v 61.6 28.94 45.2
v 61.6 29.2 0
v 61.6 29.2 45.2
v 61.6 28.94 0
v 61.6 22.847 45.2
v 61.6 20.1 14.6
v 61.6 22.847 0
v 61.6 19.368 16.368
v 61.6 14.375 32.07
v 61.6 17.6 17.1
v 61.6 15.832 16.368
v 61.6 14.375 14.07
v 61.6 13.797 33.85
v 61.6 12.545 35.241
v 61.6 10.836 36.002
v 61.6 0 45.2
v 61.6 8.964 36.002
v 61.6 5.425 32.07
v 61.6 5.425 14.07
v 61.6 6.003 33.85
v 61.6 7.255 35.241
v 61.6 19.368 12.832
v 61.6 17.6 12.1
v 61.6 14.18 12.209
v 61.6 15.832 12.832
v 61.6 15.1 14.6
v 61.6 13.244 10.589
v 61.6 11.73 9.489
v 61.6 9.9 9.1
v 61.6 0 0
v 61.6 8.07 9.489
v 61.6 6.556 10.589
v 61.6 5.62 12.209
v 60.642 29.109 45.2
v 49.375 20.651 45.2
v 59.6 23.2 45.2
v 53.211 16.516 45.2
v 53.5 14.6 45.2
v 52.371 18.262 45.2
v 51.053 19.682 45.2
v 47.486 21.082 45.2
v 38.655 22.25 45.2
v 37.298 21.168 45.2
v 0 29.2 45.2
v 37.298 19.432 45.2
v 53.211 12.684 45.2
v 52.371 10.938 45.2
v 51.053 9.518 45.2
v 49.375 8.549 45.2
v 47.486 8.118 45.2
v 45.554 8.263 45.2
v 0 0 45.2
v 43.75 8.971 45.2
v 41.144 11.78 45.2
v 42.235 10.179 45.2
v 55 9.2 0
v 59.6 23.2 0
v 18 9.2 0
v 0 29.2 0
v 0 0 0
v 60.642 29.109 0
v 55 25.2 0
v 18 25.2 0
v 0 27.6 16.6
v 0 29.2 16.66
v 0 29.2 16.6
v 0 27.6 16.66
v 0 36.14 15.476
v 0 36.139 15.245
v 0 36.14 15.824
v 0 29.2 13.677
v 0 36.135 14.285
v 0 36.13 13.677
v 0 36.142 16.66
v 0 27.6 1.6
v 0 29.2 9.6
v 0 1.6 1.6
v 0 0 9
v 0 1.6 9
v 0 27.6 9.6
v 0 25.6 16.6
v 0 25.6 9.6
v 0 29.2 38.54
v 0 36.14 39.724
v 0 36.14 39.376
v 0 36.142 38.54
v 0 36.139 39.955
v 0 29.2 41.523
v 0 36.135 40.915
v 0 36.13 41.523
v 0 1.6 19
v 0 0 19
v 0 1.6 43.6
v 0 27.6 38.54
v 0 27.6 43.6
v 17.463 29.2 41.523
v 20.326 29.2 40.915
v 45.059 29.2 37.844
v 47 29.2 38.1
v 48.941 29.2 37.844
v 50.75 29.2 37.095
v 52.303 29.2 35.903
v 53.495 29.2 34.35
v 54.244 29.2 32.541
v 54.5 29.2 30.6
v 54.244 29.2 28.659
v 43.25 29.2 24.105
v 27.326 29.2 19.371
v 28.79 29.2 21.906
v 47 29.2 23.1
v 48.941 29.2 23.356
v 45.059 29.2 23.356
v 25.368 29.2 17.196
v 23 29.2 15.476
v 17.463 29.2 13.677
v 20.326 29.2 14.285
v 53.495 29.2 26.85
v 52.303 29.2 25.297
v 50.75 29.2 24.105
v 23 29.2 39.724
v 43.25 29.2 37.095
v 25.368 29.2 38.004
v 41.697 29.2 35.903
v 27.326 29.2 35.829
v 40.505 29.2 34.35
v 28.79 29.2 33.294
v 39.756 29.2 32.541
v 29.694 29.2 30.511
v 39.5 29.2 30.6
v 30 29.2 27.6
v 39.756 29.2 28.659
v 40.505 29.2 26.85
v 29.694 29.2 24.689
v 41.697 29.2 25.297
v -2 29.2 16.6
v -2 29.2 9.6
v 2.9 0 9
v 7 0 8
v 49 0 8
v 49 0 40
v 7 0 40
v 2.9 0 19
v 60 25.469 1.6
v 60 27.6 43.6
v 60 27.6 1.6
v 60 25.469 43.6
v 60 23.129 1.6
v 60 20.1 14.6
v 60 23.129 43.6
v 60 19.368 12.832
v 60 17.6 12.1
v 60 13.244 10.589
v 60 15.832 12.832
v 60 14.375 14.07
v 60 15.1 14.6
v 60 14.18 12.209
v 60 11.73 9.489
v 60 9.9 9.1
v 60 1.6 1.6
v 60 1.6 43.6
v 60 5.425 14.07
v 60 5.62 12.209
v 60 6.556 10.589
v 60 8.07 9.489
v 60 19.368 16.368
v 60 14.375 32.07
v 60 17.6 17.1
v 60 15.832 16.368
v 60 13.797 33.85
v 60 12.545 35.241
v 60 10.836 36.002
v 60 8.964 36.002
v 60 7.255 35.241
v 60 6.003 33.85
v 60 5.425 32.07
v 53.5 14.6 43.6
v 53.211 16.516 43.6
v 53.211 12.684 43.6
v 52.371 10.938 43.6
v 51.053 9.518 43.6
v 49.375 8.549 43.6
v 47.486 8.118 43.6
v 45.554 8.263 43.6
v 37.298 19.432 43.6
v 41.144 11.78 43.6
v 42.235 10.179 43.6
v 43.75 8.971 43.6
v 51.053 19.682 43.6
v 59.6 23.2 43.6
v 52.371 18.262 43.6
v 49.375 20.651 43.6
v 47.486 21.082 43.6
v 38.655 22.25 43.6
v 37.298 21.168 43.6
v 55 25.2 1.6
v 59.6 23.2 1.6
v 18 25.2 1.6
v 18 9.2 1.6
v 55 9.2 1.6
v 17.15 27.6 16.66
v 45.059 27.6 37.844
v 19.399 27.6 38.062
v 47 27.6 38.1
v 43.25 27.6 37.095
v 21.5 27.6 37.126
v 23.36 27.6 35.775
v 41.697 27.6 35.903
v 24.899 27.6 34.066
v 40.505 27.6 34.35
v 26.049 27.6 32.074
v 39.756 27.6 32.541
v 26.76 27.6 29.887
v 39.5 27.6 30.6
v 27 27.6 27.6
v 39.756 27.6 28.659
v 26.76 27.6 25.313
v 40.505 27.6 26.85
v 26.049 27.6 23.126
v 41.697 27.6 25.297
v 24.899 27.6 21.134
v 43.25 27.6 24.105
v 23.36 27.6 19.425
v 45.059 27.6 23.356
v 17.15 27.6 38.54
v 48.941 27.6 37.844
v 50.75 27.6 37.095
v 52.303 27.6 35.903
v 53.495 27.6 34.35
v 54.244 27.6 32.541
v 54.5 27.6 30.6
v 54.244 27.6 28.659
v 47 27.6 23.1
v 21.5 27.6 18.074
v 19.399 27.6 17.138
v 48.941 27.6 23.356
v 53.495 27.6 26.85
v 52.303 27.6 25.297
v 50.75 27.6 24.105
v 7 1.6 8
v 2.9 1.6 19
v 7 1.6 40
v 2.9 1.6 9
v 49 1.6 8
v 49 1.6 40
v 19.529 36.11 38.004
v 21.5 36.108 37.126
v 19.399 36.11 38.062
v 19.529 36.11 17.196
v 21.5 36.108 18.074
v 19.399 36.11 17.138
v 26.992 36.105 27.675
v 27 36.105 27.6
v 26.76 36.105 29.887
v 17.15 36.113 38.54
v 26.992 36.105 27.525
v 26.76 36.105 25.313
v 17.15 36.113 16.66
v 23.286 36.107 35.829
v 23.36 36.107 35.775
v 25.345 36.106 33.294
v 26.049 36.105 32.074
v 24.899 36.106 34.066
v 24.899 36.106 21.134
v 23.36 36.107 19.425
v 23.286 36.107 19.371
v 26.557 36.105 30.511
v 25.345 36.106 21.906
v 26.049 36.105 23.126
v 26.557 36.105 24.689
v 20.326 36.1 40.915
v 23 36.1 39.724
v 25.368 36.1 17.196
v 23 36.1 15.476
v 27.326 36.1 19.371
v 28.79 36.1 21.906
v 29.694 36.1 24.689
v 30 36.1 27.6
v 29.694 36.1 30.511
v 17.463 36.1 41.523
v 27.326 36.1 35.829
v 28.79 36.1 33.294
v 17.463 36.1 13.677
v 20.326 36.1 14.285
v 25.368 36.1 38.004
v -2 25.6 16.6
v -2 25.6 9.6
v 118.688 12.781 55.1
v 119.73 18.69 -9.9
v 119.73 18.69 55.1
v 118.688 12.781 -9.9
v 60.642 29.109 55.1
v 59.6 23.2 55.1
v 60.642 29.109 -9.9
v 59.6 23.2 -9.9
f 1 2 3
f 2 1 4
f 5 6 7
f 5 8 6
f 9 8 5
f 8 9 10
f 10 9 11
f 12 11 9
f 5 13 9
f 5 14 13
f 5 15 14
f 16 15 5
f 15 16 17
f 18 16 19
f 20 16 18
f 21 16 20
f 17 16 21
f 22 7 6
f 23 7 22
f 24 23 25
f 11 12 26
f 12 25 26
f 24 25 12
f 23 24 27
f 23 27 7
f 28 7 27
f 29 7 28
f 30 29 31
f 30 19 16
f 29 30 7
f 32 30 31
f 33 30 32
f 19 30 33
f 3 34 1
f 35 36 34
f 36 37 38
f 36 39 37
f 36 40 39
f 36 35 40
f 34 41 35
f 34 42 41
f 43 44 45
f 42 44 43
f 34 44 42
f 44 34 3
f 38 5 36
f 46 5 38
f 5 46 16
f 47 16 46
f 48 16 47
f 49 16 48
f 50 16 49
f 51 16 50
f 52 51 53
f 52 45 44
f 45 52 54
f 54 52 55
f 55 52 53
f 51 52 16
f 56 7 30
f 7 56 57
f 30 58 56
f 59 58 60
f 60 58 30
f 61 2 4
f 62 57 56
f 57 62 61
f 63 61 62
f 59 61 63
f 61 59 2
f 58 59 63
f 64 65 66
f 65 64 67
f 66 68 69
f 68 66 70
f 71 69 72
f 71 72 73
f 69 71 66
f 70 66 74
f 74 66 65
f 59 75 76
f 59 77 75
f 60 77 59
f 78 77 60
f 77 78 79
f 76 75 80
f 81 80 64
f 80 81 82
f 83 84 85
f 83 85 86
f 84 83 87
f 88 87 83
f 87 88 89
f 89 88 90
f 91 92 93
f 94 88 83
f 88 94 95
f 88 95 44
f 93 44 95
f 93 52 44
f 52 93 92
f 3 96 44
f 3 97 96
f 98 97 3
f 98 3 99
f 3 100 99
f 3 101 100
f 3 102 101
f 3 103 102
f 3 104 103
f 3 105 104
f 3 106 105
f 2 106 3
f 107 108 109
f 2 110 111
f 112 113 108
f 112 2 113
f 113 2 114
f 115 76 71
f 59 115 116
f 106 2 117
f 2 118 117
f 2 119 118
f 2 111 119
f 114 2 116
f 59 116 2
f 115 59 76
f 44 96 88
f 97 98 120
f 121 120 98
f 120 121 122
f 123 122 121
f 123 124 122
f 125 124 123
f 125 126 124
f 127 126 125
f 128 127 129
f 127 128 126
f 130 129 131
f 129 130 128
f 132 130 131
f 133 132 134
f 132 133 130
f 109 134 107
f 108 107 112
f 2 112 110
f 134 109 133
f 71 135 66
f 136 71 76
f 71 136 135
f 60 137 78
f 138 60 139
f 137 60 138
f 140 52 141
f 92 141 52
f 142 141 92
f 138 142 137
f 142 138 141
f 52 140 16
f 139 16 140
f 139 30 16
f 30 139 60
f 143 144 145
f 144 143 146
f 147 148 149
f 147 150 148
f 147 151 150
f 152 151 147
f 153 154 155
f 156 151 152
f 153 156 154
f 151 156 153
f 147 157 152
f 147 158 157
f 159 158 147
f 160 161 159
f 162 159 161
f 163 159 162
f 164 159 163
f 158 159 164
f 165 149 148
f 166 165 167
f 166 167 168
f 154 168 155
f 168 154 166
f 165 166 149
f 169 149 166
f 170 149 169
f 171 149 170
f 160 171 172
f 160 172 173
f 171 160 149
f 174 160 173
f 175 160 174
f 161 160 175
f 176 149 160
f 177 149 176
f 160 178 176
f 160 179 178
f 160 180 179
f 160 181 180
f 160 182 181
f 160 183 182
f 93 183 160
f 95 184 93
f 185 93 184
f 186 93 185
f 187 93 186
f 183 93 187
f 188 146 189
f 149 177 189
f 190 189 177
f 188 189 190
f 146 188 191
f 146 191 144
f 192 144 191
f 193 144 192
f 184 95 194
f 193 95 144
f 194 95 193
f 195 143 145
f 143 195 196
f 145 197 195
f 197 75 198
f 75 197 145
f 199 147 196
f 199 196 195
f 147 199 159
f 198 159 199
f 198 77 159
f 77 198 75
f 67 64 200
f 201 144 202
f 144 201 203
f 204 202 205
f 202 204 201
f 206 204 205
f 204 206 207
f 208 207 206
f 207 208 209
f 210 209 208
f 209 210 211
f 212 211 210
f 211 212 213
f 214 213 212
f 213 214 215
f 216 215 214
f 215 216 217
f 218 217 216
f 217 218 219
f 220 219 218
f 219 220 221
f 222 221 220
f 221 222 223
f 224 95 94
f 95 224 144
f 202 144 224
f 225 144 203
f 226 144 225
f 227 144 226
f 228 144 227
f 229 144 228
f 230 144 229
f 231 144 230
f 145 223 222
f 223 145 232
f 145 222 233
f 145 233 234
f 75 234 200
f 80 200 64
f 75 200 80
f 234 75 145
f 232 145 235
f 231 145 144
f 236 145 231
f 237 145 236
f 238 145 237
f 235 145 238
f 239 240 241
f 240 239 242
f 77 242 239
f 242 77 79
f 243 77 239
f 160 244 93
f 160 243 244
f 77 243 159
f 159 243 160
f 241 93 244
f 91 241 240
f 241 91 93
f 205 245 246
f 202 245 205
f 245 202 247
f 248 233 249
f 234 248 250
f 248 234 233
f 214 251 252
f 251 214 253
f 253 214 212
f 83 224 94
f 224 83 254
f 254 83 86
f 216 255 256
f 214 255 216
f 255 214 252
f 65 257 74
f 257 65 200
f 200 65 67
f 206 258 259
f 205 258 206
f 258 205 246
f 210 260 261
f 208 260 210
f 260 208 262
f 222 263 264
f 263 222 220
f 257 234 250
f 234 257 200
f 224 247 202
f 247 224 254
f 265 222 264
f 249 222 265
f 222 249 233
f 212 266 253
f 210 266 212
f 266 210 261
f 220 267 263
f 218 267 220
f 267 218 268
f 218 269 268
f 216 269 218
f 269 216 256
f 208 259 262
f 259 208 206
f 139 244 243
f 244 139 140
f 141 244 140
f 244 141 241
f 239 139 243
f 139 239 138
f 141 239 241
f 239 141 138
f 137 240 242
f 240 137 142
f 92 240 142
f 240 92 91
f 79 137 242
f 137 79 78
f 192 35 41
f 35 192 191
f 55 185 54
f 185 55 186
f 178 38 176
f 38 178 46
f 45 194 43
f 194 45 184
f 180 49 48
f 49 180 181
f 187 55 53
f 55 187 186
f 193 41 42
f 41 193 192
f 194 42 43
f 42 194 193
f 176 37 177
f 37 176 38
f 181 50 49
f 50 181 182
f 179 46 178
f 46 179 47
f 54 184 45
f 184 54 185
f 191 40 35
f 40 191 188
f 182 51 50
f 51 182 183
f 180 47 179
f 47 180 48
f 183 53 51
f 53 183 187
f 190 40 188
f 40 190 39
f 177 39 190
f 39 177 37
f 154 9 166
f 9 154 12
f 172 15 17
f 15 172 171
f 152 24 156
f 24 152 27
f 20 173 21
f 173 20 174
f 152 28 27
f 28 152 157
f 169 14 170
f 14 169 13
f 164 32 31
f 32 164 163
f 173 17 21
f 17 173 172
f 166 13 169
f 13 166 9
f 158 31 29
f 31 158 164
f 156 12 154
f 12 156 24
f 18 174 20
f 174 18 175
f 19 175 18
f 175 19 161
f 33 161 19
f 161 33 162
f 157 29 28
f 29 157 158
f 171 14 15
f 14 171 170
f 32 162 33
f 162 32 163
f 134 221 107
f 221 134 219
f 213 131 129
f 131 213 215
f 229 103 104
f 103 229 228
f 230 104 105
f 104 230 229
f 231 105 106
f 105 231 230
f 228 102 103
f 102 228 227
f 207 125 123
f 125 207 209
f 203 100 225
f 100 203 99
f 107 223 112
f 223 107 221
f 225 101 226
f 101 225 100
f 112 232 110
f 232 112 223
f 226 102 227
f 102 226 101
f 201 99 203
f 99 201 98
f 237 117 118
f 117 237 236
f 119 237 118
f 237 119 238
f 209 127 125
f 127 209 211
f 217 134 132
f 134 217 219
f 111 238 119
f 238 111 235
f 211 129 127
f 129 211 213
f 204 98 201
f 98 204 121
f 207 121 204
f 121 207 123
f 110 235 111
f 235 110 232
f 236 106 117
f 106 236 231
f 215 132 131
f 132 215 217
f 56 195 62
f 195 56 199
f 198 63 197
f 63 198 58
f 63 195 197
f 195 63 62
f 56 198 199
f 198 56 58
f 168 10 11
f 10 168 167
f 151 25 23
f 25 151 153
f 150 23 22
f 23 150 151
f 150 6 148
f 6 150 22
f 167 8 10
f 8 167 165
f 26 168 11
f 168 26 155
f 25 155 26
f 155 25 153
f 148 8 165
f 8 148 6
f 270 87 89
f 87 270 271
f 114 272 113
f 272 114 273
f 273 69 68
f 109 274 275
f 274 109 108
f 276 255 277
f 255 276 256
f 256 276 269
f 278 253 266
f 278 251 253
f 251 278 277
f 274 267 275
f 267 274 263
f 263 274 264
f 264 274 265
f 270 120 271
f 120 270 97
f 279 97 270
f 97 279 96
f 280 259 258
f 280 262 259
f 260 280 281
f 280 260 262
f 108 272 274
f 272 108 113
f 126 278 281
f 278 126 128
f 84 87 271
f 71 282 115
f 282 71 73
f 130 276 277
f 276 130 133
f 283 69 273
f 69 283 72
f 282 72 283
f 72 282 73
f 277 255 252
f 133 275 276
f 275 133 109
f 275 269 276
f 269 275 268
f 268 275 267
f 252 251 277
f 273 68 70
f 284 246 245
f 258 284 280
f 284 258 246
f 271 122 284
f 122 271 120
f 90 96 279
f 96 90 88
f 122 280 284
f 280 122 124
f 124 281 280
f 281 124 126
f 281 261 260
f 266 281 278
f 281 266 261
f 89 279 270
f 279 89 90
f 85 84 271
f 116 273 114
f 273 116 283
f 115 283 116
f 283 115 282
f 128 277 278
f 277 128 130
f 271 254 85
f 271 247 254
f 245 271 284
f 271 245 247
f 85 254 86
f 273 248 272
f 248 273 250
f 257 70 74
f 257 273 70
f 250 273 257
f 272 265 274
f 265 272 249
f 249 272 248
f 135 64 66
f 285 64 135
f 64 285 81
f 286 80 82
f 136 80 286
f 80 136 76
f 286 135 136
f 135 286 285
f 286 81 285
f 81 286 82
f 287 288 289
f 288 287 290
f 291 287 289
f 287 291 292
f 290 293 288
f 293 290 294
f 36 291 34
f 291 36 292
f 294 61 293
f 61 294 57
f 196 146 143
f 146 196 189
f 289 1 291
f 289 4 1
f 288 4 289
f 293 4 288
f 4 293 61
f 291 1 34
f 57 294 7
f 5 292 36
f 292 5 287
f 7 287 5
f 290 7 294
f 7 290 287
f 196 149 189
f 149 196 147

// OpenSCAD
// Holder for action camera for Zhiyun Smooth Q

nozzleD=0.4;
wallCount=4;
wallThickness=wallCount*nozzleD;
wallThickness2=wallThickness*2;
e=0.1; // epsilon
e2=e*2;

cameraHolder();

module cameraHolder() {
    difference() {
        cube(holderBody);
        translate([-e,wallThickness,wallThickness])
            cameraBody();
        cameraLenseCut();
        screenCut();
        screenLedCut();
        okButtonCut();
        upDownButtonCut();
        powerButtonCut();
        batteryCut();
        speakerCut();
    }
    lensHook();
    lensProtection();
    holderPlate();
}

cameraBodyX=60;
cameraBodyY=26;
cameraBodyZ=42;
cameraBody=[cameraBodyX+e,cameraBodyY,cameraBodyZ];
holderBody=[cameraBodyX+wallThickness,cameraBodyY+wallThickness2,cameraBodyZ+wallThickness2];

module cameraBody() {
    cube(cameraBody);
}

cameraLenseD=22;
cameraLenseR=cameraLenseD/2;
cameraLenseX=5+cameraLenseR;
cameraLenseZ=15+wallThickness+cameraLenseR;
cameraLenseY=wallThickness2+cameraBodyY+e;

module cameraLense() {
    translate([cameraLenseX,cameraLenseY+30,cameraLenseZ])
        rotate([90,0,0])
            cylinder(d=cameraLenseD,h=wallThickness2+30);
}

module cameraLenseCut() {
    hull() {
        cameraLense();
        translate([-100,0,0]) cameraLense();
    }
}

module screenCut() {
    translate([7,-e,8])
        cube([42,wallThickness+e2,32]);
}

module screenLedCut() {
    translate([-e,-e,9])
        cube([3,wallThickness+e2,10]);
}

module okButtonCut() {
    translate([47, 13+wallThickness, cameraBodyZ+wallThickness-e])
        hull() {
            cylinder(d=13,wallThickness+e2);
            translate([-7.9,5.7,0]) cylinder(d=4,wallThickness+e2);
        }
}

module upDownButtonCut() {
    d=9;
    hull() {
        translate([cameraBodyX-e,8.3+wallThickness,30+wallThickness])
            rotate([0,90,0]) 
                cylinder(d=d,h=wallThickness+e2);
        translate([cameraBodyX-e,8.3+wallThickness,12+wallThickness])
            rotate([0,90,0]) 
                cylinder(d=d,h=wallThickness+e2);
    }
}

module powerButtonCut() {
    translate([47,cameraBodyY+wallThickness2+e,29+wallThickness])
    rotate([90,0,0])
        cylinder(d=15,h=wallThickness+e2);
}

module batteryCut() {
    translate([18,7.6+wallThickness,-e])
        cube([37,16,wallThickness+e2]);
}

module speakerCut() {
    translate([cameraBodyX-e,16+wallThickness,13+wallThickness])
        rotate([0,90,0]) 
            cylinder(d=5,h=wallThickness+e2);
}

module lensHook() {
    x=2;
    y=2;
    z=7;
    translate([-x,cameraBodyY+wallThickness-y,9.6])
        cube([x,y+wallThickness,z]);
}

module lensProtection() {
    h=7;
    d=28;
    difference() {
        hull() {
            translate([cameraLenseX,cameraLenseY+h-2*e,cameraLenseZ])
                rotate([90,0,0])
                    cylinder(d=d,h=h);
            translate([-100,cameraLenseY+h,cameraLenseZ])
                rotate([90,0,0])
                    cylinder(d=d,h=h);            
        }
        cameraLenseCut();
        translate([-200,0,0]) cube([200,200,200]);
    }
}

module holderPlate() {
    x=60;
    y=6;
    z=65;
    translate([cameraBodyX+wallThickness-y/3,cameraBodyY+2*wallThickness-y,-z/2+cameraBodyZ/2+wallThickness])
        rotate([0,0,-10])
            cube([x,y,z]);
}
